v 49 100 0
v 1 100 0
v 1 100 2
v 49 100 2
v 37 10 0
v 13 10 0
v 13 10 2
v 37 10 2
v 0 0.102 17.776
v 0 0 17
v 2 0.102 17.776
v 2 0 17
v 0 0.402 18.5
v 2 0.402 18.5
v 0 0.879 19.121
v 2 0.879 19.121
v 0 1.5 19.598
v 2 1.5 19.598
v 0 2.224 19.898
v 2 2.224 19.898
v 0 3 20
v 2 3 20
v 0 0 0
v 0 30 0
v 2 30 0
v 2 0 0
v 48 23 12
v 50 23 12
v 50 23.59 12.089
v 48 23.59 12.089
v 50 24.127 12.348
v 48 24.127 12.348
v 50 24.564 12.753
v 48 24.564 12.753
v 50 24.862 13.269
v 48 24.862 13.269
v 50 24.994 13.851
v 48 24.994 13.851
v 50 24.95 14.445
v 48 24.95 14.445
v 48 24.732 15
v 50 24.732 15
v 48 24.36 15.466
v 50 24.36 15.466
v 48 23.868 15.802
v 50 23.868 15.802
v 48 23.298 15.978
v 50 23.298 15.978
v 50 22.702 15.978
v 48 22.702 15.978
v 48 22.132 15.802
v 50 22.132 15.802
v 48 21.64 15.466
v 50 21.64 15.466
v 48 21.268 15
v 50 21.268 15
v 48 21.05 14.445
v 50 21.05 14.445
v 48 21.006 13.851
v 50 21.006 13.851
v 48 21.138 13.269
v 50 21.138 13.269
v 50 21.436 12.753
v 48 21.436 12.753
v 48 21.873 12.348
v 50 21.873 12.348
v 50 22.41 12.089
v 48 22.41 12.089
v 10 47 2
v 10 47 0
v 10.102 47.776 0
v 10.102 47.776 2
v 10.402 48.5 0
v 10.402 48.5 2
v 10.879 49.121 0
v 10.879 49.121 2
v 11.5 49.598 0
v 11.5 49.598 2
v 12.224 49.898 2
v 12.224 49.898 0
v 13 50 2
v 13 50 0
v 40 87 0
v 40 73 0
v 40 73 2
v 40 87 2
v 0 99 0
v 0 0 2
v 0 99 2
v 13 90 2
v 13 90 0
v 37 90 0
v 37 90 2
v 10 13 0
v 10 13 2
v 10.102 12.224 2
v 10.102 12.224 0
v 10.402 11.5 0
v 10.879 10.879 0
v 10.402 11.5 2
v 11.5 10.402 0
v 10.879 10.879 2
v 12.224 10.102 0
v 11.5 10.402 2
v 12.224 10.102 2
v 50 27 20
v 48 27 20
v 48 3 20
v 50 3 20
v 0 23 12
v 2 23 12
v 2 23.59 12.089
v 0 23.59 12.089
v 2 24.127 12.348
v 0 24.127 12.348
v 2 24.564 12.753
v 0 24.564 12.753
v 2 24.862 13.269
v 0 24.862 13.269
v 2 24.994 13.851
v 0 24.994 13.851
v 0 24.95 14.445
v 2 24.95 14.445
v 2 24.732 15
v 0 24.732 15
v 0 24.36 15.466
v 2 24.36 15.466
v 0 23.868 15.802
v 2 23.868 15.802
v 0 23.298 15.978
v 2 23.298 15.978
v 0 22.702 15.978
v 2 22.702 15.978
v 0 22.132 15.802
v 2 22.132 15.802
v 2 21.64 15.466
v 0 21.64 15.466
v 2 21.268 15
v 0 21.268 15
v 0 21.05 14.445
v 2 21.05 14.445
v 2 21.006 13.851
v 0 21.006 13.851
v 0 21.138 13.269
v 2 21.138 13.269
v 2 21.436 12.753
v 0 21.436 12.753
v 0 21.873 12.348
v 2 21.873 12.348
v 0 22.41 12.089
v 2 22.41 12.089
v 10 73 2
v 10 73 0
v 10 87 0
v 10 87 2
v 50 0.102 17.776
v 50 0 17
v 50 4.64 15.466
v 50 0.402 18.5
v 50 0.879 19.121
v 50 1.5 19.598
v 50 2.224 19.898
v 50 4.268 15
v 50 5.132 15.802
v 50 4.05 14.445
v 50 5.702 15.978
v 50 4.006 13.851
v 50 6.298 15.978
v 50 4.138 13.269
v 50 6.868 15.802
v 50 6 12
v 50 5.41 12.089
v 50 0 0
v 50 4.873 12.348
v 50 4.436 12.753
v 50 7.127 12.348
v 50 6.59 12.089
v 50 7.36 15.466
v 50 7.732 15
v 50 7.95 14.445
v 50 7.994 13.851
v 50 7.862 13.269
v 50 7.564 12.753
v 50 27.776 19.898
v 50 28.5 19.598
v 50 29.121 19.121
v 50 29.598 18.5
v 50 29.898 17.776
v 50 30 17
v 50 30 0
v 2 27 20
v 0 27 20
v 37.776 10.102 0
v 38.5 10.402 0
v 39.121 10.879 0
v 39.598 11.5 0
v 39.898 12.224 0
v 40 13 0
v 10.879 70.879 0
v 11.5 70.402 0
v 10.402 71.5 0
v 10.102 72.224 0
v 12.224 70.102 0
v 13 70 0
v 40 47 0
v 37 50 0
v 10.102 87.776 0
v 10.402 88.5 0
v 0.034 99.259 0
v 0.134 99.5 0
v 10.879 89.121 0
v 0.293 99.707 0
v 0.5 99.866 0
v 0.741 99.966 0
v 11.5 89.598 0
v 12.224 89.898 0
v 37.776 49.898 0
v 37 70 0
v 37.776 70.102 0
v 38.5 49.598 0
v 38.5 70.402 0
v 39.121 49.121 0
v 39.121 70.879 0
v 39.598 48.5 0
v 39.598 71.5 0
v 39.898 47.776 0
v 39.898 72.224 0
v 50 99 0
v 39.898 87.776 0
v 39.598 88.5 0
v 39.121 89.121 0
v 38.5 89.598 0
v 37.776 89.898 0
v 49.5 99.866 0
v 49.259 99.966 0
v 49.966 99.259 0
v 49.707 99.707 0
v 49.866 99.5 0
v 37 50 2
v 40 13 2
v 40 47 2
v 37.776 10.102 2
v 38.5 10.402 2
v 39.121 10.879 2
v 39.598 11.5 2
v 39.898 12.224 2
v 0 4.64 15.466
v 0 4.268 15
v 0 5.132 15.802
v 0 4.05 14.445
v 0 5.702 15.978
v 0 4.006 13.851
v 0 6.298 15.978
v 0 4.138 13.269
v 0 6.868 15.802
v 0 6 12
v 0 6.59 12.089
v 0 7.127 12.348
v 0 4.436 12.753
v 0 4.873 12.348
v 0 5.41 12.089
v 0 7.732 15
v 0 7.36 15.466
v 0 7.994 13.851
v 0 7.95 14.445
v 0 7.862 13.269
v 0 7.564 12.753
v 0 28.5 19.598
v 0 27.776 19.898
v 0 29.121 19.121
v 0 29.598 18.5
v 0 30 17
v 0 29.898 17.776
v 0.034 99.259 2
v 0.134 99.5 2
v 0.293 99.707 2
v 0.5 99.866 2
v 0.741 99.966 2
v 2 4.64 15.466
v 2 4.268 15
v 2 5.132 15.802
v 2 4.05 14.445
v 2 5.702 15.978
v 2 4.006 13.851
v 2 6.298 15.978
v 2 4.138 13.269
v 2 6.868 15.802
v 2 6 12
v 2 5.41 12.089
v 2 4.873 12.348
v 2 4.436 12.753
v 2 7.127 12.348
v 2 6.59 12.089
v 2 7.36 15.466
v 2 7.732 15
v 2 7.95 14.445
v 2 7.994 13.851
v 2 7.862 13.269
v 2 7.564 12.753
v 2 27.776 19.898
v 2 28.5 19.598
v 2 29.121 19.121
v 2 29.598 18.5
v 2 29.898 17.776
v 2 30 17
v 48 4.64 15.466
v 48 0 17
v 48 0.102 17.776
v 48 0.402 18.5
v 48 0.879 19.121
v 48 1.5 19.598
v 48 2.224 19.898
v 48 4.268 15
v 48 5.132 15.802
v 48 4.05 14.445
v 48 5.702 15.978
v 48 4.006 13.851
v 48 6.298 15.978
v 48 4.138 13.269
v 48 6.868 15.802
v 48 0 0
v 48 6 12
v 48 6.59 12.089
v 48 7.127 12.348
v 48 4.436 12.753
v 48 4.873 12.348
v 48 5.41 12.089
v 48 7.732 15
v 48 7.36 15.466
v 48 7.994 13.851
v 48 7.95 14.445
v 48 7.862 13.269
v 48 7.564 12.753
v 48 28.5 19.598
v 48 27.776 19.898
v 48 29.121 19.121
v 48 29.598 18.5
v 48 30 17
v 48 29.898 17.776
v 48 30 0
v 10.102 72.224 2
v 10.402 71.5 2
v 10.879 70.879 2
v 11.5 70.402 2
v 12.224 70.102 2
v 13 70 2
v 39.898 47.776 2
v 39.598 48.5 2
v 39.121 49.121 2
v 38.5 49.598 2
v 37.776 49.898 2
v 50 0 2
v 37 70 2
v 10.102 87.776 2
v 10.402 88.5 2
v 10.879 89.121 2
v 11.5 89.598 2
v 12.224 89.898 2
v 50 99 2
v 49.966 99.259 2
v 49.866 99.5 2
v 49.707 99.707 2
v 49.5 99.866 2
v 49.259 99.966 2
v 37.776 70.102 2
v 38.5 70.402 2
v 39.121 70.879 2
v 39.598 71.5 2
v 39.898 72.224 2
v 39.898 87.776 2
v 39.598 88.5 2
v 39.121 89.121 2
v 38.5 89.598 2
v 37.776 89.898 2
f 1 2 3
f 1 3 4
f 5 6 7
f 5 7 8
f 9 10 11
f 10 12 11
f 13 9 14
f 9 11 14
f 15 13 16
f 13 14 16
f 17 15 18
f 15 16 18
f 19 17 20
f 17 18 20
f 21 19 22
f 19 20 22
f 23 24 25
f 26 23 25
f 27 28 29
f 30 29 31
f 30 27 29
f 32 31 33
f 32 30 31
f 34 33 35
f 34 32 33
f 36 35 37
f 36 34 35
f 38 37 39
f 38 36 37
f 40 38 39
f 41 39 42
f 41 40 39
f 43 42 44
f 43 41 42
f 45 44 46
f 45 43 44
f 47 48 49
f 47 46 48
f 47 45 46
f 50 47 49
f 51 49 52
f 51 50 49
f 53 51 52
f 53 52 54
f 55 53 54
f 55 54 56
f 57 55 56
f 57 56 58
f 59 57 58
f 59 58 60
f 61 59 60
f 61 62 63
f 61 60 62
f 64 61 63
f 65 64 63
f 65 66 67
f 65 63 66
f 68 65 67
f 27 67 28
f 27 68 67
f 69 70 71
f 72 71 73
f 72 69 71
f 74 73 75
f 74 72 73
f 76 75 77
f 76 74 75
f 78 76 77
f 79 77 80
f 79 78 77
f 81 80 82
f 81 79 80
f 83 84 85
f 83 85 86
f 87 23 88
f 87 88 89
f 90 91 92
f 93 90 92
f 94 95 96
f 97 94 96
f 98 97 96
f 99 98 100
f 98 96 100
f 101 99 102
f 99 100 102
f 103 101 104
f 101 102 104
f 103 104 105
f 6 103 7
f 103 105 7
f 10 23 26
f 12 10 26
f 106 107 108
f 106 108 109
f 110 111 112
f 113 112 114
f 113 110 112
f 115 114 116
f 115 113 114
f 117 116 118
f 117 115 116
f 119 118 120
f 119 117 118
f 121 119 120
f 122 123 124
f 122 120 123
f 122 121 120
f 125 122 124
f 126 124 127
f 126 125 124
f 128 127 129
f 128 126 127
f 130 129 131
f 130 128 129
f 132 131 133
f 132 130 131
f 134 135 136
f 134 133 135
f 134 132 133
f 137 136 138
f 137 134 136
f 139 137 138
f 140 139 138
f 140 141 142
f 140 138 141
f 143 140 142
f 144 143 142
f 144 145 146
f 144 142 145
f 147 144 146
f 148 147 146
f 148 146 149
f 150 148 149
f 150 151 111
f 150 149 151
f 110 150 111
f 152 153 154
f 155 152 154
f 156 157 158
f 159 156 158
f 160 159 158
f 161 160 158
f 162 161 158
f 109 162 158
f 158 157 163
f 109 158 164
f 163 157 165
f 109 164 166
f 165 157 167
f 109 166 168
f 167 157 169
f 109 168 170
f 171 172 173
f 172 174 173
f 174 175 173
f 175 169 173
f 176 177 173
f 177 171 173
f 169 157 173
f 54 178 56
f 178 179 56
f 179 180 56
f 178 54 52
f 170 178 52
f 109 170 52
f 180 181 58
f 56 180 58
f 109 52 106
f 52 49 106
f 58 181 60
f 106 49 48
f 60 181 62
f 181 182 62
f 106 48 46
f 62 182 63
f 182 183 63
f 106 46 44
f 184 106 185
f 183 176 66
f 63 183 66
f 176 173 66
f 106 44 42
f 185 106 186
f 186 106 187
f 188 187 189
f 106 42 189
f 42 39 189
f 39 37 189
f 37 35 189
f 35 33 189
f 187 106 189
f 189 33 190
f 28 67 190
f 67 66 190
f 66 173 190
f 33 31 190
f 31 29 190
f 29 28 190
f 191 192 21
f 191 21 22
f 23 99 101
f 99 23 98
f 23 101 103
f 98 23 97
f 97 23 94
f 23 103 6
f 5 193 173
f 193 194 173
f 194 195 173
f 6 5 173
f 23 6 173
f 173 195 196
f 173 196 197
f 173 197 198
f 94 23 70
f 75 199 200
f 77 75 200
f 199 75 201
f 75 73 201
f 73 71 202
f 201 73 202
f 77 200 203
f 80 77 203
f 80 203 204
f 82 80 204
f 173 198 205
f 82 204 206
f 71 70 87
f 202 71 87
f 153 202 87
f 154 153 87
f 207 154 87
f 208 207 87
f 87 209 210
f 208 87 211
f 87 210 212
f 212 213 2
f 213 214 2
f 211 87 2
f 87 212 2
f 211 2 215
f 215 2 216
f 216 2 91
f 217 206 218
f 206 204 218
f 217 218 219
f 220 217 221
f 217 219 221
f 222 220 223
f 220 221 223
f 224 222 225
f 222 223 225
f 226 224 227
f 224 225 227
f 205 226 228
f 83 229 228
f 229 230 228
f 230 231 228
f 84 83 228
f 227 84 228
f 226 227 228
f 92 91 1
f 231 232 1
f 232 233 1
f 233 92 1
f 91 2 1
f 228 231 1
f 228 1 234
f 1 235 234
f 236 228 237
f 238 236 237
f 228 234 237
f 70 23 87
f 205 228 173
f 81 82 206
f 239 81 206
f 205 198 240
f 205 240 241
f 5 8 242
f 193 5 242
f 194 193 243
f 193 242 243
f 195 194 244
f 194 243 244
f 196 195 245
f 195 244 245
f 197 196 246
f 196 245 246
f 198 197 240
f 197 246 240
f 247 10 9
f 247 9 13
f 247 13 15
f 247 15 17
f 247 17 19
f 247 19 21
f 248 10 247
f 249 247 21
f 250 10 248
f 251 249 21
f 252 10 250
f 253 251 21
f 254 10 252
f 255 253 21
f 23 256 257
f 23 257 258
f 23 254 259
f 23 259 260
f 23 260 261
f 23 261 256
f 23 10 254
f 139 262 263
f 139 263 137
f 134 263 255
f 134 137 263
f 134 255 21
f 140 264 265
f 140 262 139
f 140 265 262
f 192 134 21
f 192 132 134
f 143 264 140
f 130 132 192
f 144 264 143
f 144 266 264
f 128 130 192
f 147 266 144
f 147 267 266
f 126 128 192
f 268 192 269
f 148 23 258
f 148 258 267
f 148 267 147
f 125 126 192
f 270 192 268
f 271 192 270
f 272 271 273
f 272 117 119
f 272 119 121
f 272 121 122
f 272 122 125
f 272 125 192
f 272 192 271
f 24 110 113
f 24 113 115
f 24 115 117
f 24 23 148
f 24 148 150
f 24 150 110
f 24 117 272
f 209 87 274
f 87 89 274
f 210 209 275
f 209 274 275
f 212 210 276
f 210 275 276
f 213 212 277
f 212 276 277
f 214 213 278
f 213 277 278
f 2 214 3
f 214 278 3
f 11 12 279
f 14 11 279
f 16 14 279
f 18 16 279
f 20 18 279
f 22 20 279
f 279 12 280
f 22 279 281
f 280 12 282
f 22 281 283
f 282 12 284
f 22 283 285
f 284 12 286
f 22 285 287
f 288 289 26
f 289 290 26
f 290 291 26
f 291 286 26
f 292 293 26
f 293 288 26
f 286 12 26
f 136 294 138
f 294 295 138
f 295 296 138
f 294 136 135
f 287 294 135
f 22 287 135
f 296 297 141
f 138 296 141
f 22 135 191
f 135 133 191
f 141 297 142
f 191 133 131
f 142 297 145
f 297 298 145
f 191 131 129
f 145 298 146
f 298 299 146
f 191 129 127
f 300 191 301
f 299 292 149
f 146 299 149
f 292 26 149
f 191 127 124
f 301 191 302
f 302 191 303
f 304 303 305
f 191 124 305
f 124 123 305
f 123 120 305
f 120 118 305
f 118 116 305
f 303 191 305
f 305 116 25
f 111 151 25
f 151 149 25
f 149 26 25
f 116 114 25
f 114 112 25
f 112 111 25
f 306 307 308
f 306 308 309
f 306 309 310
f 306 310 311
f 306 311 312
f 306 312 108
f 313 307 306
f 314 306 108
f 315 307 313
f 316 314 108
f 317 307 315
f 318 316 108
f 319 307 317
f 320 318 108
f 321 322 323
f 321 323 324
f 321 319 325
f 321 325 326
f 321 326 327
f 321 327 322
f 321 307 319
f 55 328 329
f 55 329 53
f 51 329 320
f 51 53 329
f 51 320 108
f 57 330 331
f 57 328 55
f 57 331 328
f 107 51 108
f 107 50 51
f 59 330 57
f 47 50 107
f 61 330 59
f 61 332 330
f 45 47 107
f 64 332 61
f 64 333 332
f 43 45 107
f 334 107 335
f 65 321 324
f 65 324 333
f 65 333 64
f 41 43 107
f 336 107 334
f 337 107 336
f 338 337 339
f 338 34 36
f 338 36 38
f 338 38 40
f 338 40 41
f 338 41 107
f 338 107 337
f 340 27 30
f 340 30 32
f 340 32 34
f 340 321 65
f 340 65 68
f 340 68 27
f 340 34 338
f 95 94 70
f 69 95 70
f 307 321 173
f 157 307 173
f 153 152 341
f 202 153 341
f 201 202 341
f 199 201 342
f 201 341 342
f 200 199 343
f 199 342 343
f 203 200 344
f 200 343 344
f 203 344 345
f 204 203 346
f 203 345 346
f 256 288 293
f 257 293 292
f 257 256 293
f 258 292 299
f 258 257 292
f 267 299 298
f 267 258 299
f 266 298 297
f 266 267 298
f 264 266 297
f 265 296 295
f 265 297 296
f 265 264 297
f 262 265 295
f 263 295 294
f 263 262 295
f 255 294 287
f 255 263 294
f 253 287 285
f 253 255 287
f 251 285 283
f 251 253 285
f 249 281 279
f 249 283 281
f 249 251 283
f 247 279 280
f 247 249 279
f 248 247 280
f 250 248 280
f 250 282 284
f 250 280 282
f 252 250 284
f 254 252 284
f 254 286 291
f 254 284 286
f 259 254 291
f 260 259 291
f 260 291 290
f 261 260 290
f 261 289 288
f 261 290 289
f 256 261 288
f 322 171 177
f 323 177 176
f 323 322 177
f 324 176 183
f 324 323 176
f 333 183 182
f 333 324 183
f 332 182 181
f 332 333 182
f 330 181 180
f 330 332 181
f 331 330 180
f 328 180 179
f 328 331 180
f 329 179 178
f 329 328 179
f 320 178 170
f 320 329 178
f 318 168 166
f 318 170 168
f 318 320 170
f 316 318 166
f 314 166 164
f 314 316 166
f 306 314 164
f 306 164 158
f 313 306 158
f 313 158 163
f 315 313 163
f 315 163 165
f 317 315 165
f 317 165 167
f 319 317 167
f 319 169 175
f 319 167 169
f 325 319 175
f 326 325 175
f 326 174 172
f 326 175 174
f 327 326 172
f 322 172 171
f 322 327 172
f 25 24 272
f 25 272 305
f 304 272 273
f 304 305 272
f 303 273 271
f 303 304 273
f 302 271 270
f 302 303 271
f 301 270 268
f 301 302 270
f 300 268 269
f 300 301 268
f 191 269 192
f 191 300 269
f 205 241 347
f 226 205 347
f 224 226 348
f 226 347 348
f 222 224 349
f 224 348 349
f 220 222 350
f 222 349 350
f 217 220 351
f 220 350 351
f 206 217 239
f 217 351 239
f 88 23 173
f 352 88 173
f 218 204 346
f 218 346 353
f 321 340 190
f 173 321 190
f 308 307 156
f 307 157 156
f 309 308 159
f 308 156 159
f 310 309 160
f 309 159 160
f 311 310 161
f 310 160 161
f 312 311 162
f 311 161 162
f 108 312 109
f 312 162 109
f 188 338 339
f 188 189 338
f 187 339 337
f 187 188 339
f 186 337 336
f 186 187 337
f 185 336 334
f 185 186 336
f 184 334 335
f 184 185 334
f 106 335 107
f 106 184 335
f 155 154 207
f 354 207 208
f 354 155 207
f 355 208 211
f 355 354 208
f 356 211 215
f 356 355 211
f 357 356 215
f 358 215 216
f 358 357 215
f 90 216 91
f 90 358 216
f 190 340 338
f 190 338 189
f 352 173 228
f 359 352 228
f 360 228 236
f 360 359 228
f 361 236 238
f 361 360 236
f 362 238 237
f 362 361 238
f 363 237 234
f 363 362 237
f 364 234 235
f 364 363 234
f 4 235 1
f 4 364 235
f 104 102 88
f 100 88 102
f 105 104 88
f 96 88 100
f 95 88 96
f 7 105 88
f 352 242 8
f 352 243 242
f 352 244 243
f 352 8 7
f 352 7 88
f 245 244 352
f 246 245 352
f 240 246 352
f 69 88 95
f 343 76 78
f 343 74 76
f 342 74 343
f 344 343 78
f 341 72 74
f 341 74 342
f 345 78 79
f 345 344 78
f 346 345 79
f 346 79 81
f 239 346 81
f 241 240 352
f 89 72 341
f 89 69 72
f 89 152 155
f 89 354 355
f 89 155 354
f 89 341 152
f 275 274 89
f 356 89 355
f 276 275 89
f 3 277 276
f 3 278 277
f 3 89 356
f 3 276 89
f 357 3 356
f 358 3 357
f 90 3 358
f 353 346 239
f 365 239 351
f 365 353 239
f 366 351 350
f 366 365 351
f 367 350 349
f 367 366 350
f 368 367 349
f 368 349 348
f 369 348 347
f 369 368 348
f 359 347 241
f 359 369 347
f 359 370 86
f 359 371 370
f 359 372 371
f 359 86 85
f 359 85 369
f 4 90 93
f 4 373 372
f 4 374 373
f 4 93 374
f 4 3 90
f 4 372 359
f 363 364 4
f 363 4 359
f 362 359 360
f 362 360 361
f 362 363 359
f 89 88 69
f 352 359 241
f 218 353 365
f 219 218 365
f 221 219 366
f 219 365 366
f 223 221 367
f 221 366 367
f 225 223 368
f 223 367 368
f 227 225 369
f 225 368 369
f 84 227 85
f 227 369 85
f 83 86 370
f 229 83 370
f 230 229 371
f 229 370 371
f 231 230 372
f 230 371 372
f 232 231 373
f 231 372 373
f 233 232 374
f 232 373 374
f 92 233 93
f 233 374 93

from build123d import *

# Parameters (mm, degrees)
BOX002_W          = 30
BOX002_H          = 40
BOX002_DEPTH      = 3
FILLET002_R       = 3
BOX001_W          = 30
BOX001_H          = 20
BOX001_DEPTH      = 3
FILLET001_R       = 3
BOX_W             = 50
BOX_H             = 100
BOX_DEPTH         = 2
FILLET_R          = 1
CYLINDER001_R     = 2
CYLINDER001_DEPTH = 3
CYLINDER_R        = 2
CYLINDER_DEPTH    = 3
BOX003_W          = 2
BOX003_H          = 30
BOX003_DEPTH      = 20
FILLET003_R       = 3
CYLINDER003_R     = 2
CYLINDER003_DEPTH = 3
CYLINDER002_R     = 2
CYLINDER002_DEPTH = 3
BOX004_W          = 2
BOX004_H          = 30
BOX004_DEPTH      = 20
FILLET004_R       = 3


with BuildPart() as fillet002:
    # Box002 → Box002 (new body)
    with BuildSketch(Plane.XY):
        with Locations((15, 20)):
            Rectangle(BOX002_W, BOX002_H)
    extrude(amount=BOX002_DEPTH)

    # Fillet002
    fillet002_edges = [fillet002.edges().sort_by_distance(p)[0] for p in [
        (0, 0, 1.5),
        (0, 40, 1.5),
        (30, 0, 1.5),
        (30, 40, 1.5),
    ]]
    fillet(fillet002_edges, radius=FILLET002_R)


with BuildPart() as fillet002_1:
    # Fillet002 placement: moved
    add(fillet002.part.moved(Location((10, 10, 0))))


with BuildPart() as fillet001:
    # Box001 → Box001 (new body)
    with BuildSketch(Plane.XY):
        with Locations((15, 10)):
            Rectangle(BOX001_W, BOX001_H)
    extrude(amount=BOX001_DEPTH)

    # Fillet001
    fillet001_edges = [fillet001.edges().sort_by_distance(p)[0] for p in [
        (0, 0, 1.5),
        (0, 20, 1.5),
        (30, 0, 1.5),
        (30, 20, 1.5),
    ]]
    fillet(fillet001_edges, radius=FILLET001_R)


with BuildPart() as fillet001_1:
    # Fillet001 placement: moved
    add(fillet001.part.moved(Location((10, 70, 0))))


with BuildPart() as base:
    # Box → Box (new body)
    with BuildSketch(Plane.XY):
        with Locations((25, 50)):
            Rectangle(BOX_W, BOX_H)
    extrude(amount=BOX_DEPTH)

    # Fillet
    fillet_edges = [base.edges().sort_by_distance(p)[0] for p in [
        (0, 100, 1),
        (50, 100, 1),
    ]]
    fillet(fillet_edges, radius=FILLET_R)

    # Cut: cut Fillet001
    add(fillet001_1.part, mode=Mode.SUBTRACT)

    # Cut001: cut Fillet002
    add(fillet002_1.part, mode=Mode.SUBTRACT)


with BuildPart() as cilindre001:
    # Cylinder001 → Cylinder001 (new body)
    with BuildSketch(Plane(origin=(0, 23, 14), x_dir=(0, 0, -1), z_dir=(1, 0, 0))):
        Circle(CYLINDER001_R)
    extrude(amount=CYLINDER001_DEPTH)


with BuildPart() as fusion:
    # Cylinder → Cylinder (new body)
    with BuildSketch(Plane(origin=(0, 6, 14), x_dir=(0, 0, -1), z_dir=(1, 0, 0))):
        Circle(CYLINDER_R)
    extrude(amount=CYLINDER_DEPTH)

    # Fusion: union Cilindre001
    add(cilindre001.part)


with BuildPart() as costat:
    # Box003 → Box003 (new body)
    with BuildSketch(Plane.XY):
        with Locations((1, 15)):
            Rectangle(BOX003_W, BOX003_H)
    extrude(amount=BOX003_DEPTH)

    # Fillet003
    fillet003_edges = [costat.edges().sort_by_distance(p)[0] for p in [
        (1, 0, 20),
        (1, 30, 20),
    ]]
    fillet(fillet003_edges, radius=FILLET003_R)

    # Cut002: cut Fusion
    add(fusion.part, mode=Mode.SUBTRACT)


with BuildPart() as cilindre003:
    # Cylinder003 → Cylinder003 (new body)
    with BuildSketch(Plane(origin=(0, 23, 14), x_dir=(0, 0, -1), z_dir=(1, 0, 0))):
        Circle(CYLINDER003_R)
    extrude(amount=CYLINDER003_DEPTH)


with BuildPart() as fusion001:
    # Cylinder002 → Cylinder002 (new body)
    with BuildSketch(Plane(origin=(0, 6, 14), x_dir=(0, 0, -1), z_dir=(1, 0, 0))):
        Circle(CYLINDER002_R)
    extrude(amount=CYLINDER002_DEPTH)

    # Fusion001: union Cilindre003
    add(cilindre003.part)


with BuildPart() as costat001:
    # Box004 → Box004 (new body)
    with BuildSketch(Plane.XY):
        with Locations((1, 15)):
            Rectangle(BOX004_W, BOX004_H)
    extrude(amount=BOX004_DEPTH)

    # Fillet004
    fillet004_edges = [costat001.edges().sort_by_distance(p)[0] for p in [
        (1, 0, 20),
        (1, 30, 20),
    ]]
    fillet(fillet004_edges, radius=FILLET004_R)

    # Cut003: cut Fusion001
    add(fusion001.part, mode=Mode.SUBTRACT)


with BuildPart() as costat001_1:
    # Cut003 placement: moved
    add(costat001.part.moved(Location((48, 0, 0))))


solid = Compound([base.part, costat.part, costat001_1.part])
